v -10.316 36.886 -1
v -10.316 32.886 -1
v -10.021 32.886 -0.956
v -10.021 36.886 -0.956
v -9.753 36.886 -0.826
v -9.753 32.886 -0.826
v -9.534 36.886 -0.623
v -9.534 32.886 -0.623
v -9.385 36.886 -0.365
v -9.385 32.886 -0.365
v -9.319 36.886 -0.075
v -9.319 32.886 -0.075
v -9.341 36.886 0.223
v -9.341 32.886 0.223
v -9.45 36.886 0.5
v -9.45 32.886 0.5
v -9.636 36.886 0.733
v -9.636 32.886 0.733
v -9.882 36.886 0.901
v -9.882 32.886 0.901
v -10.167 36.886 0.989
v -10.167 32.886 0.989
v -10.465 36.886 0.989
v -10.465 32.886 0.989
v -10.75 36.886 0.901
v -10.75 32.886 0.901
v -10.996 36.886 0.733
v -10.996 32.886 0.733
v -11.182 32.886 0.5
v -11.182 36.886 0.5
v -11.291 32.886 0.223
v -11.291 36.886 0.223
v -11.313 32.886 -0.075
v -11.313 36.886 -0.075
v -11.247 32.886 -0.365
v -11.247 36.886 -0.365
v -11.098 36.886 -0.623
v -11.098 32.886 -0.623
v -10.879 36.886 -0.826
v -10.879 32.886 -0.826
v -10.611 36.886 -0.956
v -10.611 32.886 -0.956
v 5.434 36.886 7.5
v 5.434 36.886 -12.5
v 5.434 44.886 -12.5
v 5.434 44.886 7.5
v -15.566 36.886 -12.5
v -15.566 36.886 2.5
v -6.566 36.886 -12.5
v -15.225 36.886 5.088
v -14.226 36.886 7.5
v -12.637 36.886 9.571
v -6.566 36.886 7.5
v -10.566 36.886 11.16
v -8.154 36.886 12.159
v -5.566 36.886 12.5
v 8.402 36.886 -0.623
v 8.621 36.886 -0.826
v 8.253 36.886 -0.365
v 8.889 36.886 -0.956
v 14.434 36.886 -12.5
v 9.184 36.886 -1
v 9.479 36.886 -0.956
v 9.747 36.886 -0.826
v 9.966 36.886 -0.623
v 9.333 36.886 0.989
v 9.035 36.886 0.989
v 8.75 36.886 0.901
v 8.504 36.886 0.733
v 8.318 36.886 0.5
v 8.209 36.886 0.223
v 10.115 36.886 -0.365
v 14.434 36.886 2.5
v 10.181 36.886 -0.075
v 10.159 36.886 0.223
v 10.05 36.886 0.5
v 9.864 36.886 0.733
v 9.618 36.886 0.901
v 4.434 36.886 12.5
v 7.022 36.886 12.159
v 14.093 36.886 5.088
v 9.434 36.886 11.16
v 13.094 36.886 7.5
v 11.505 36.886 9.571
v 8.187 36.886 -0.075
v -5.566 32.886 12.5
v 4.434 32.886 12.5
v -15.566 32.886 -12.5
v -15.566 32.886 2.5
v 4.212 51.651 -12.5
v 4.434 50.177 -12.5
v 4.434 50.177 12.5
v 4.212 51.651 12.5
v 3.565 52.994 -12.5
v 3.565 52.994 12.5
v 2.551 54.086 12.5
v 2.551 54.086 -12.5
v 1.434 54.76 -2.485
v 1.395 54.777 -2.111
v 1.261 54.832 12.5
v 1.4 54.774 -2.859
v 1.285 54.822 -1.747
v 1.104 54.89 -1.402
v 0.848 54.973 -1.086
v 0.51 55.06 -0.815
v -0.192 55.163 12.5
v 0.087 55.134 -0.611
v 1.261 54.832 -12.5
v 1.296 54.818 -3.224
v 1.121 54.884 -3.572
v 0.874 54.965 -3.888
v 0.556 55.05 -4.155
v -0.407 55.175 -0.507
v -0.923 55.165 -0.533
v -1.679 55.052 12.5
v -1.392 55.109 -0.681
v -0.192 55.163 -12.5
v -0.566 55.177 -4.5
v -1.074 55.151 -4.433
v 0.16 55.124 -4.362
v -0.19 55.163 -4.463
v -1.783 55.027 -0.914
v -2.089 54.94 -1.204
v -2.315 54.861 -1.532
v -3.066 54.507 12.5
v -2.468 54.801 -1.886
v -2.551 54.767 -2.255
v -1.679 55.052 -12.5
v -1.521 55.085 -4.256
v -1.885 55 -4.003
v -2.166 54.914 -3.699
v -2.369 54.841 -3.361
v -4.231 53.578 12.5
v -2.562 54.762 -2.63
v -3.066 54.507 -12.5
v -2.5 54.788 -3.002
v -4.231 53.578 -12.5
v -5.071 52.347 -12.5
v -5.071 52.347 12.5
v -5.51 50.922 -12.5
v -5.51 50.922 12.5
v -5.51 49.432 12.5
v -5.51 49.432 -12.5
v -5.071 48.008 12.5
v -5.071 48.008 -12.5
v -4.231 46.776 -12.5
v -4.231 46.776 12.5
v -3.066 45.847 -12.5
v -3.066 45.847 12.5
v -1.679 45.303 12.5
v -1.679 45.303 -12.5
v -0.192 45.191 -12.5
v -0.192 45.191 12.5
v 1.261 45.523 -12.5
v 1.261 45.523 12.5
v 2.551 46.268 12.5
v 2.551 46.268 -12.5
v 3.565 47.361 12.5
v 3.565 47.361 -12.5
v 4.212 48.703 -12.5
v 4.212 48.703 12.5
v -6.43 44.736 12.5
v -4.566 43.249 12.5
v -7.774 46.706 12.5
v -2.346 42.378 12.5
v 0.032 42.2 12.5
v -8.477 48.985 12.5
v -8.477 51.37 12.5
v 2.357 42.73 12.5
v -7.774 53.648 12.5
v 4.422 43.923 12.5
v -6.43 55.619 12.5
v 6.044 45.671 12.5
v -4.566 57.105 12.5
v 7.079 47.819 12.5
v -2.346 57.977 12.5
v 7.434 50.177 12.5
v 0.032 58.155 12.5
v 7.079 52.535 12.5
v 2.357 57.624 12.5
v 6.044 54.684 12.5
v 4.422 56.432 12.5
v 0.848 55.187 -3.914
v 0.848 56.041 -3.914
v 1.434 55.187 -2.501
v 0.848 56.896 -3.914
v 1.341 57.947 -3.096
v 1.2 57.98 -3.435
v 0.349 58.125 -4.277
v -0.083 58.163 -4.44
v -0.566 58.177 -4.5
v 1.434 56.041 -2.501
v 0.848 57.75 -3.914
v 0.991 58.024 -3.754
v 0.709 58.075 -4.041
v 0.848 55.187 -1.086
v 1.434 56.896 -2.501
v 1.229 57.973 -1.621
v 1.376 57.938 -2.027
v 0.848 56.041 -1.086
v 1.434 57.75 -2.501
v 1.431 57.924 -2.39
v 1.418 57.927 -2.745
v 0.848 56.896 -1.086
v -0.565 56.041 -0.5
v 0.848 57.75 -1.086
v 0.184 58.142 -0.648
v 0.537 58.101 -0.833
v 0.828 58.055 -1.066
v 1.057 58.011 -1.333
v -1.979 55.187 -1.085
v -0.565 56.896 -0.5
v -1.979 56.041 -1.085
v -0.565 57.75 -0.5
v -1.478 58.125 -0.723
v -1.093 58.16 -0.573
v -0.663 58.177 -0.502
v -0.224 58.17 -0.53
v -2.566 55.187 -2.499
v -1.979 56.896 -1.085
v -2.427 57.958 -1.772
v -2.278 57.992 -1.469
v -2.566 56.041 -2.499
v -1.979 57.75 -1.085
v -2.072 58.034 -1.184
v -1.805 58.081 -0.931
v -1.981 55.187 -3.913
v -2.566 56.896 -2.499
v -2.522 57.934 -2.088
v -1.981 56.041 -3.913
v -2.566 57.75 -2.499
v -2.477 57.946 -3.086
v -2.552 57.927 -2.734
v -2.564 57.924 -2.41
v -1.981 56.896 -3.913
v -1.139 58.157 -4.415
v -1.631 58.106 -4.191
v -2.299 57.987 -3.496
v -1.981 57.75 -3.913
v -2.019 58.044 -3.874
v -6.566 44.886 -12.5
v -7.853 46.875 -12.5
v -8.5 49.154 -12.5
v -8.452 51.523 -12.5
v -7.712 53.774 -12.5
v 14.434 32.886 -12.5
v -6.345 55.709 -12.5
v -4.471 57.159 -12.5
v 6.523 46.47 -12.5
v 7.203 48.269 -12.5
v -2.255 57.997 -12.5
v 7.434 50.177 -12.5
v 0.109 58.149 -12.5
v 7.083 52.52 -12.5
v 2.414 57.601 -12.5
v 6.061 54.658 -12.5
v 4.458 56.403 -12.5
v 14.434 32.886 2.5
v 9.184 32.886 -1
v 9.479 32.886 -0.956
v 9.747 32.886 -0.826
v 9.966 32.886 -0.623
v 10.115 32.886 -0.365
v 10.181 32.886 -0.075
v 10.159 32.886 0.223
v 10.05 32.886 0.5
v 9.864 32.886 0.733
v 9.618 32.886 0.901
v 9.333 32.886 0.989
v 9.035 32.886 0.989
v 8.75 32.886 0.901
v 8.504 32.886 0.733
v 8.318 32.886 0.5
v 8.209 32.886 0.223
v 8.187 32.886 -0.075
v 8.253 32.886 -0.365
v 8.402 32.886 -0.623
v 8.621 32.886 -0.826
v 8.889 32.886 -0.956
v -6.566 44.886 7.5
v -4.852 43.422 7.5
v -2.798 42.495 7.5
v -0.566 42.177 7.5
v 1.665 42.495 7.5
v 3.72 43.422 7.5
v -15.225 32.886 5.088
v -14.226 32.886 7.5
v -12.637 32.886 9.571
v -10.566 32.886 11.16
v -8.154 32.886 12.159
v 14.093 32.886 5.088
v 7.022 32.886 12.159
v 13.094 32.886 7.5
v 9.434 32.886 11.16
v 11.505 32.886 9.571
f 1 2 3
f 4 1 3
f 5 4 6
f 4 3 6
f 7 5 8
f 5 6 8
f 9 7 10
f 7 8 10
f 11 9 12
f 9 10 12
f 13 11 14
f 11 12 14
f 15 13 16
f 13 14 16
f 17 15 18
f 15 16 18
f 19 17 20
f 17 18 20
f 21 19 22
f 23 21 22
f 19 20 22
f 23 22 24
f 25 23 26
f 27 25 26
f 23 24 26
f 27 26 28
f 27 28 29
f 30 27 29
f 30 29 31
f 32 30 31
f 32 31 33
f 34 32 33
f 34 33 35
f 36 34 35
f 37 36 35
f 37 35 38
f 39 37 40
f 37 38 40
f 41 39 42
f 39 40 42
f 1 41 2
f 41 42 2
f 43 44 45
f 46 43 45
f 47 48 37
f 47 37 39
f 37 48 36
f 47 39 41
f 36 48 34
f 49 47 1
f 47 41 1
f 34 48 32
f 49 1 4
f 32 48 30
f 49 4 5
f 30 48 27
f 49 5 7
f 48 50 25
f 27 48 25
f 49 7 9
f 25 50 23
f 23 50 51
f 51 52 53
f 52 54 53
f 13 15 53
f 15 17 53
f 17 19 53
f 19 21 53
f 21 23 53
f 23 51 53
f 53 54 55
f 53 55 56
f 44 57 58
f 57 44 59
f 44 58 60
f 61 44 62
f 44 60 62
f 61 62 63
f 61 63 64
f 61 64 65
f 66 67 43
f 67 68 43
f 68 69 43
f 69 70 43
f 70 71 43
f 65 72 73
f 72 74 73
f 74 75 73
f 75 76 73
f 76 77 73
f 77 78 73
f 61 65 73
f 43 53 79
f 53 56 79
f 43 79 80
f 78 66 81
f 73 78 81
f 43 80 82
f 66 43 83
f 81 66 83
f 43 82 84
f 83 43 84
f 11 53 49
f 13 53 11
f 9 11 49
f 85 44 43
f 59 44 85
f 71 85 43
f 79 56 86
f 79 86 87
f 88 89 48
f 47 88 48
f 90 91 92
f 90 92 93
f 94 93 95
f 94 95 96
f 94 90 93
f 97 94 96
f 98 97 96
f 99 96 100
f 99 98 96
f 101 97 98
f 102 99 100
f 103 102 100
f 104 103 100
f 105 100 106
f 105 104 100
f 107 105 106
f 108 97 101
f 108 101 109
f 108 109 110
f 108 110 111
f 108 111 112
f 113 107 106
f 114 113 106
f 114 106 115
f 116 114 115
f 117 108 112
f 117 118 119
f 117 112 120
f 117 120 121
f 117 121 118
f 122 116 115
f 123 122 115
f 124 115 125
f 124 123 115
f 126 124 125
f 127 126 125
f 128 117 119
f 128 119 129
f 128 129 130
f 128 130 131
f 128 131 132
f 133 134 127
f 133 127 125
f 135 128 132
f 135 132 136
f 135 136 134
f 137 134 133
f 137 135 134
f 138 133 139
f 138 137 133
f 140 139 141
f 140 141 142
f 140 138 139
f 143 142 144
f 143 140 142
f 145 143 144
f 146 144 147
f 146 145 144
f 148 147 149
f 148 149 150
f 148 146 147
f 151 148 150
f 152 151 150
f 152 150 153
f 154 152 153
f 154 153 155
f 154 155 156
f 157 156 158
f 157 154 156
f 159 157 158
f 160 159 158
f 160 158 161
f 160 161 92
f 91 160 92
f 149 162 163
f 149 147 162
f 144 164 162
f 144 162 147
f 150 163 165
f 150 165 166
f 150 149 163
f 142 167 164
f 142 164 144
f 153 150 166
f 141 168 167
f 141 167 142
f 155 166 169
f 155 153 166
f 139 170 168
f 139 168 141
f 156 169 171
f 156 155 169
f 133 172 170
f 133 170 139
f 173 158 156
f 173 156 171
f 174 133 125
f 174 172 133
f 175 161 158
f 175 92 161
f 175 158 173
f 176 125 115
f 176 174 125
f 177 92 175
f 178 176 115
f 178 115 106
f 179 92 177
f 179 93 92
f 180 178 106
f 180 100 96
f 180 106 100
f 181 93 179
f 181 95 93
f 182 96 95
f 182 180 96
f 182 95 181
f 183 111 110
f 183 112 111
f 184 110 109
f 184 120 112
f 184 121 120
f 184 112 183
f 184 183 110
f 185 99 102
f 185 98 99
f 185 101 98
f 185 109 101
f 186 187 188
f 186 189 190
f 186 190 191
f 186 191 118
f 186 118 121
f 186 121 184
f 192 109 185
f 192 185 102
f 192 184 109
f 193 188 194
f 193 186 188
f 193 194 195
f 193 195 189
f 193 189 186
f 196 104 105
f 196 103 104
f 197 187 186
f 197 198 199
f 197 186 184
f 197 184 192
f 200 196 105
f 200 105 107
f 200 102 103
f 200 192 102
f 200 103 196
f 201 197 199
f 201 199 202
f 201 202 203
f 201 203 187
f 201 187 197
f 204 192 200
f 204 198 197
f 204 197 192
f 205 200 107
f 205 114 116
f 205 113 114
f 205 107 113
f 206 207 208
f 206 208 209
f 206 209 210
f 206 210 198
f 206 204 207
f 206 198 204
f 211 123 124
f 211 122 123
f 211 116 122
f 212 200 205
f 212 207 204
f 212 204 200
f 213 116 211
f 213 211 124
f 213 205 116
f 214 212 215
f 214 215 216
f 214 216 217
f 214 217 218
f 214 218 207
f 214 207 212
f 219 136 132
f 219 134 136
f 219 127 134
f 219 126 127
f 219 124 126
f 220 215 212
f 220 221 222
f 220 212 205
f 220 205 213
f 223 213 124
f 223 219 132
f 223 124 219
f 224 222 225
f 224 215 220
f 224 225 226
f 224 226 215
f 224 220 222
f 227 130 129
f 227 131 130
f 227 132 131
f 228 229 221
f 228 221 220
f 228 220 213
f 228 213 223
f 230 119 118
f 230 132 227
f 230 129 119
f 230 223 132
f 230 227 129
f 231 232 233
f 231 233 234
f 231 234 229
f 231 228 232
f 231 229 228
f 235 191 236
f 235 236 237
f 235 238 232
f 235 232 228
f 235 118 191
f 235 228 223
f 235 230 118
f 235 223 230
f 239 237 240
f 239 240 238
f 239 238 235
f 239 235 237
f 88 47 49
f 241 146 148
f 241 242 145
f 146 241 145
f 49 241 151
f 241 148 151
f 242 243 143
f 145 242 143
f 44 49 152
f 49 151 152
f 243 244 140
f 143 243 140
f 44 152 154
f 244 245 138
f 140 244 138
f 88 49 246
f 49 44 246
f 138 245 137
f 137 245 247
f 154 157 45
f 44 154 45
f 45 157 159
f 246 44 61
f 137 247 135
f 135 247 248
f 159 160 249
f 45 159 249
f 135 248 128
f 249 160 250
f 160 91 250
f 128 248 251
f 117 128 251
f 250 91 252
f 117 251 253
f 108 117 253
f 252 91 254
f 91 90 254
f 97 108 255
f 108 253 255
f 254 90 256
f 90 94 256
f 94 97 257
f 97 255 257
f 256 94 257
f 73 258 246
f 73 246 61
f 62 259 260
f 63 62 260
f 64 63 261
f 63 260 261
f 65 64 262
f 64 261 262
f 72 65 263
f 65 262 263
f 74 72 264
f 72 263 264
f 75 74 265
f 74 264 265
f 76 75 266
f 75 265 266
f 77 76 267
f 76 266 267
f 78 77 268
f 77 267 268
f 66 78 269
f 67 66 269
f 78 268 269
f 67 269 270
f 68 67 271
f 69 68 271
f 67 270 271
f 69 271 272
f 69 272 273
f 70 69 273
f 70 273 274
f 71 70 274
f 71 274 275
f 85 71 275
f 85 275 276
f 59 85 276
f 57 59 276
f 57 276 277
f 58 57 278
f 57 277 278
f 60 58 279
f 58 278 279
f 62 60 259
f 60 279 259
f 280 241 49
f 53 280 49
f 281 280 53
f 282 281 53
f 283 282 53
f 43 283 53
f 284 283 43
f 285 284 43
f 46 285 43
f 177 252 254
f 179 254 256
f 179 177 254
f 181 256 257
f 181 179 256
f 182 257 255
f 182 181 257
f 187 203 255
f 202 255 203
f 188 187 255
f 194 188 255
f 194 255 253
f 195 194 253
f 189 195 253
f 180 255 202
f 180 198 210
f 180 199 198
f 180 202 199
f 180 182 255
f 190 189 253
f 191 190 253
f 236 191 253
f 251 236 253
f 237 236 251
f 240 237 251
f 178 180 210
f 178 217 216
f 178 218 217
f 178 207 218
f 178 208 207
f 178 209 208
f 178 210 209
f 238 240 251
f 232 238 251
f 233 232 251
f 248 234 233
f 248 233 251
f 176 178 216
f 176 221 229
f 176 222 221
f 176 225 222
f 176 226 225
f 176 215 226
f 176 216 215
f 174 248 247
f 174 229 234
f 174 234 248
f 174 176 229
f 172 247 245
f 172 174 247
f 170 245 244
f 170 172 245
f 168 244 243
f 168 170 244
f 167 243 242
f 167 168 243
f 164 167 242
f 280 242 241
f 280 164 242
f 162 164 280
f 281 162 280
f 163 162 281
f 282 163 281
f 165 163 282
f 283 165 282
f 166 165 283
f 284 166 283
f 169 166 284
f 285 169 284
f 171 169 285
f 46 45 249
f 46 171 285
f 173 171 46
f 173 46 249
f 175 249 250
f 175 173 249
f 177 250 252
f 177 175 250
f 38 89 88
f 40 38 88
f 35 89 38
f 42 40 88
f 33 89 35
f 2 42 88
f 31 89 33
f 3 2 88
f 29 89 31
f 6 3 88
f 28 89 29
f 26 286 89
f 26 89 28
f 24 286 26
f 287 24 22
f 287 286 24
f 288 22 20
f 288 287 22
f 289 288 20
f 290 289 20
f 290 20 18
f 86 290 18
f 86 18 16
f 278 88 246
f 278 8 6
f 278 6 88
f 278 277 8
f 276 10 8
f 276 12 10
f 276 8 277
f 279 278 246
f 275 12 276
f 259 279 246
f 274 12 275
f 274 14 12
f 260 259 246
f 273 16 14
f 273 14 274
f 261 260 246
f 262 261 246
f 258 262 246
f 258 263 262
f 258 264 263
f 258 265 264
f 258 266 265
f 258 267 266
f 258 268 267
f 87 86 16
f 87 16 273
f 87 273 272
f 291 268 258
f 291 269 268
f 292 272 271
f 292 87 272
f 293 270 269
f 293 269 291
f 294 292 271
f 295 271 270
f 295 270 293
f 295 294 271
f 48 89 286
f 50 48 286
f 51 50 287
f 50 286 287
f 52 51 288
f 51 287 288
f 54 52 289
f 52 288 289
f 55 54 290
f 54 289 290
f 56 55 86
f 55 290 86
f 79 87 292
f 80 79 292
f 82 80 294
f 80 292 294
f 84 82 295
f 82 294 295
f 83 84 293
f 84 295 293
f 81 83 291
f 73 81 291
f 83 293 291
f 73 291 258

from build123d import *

# Parameters (mm, degrees)
SKETCH1_R             = 8
SKETCH1_R_2           = 5
BOSS_EXTRUDE1_DEPTH   = 12.5
SKETCH1_W             = 30
SKETCH1_H             = 4
BOSS_EXTRUDE1_2_DEPTH = 12.5
BOSS_EXTRUDE2_START   = 7.5
BOSS_EXTRUDE2_DEPTH   = 20
SKETCH2_R             = 1
CUT_EXTRUDE1_DEPTH    = 4
CUT_EXTRUDE2_START    = -26
CUT_EXTRUDE2_DEPTH    = 5


with BuildPart() as part:
    # Sketch1 → Boss-Extrude1 (new, symmetric)
    with BuildSketch(Plane.XY):
        with Locations((-0.566068823, 50.177224178)):
            Circle(SKETCH1_R)
        with Locations((-0.566068823, 50.177224178)):
            Circle(SKETCH1_R_2, mode=Mode.SUBTRACT)
    extrude(amount=BOSS_EXTRUDE1_DEPTH, both=True)



with BuildPart() as body_2:
    # Sketch1 → Boss-Extrude1 2 (new, symmetric)
    with BuildSketch(Plane.XY):
        with Locations((-0.566068823, 34.885721556)):
            Rectangle(SKETCH1_W, SKETCH1_H)
    extrude(amount=BOSS_EXTRUDE1_2_DEPTH, both=True)


with BuildPart() as part_1:
    add(part.part)

    add(body_2.part)  # Boss-Extrude2 merges body 2
    # Sketch1<5> → Boss-Extrude2 (add)
    with BuildSketch(Plane.XY.offset(BOSS_EXTRUDE2_START)):
        with BuildLine():
            Line((-6.566068823, 44.885721556), (-6.566068823, 36.885721556))
            Line((-6.566068823, 36.885721556), (5.433931177, 36.885721556))
            Line((5.433931177, 36.885721556), (5.433931177, 44.885721556))
            ThreePointArc((5.433931177, 44.885721556), (-0.566068823, 42.177224178), (-6.566068823, 44.885721556))
        make_face()
    extrude(amount=-BOSS_EXTRUDE2_DEPTH)

    # Sketch2 → Cut-Extrude1 (cut)
    with BuildSketch(Plane.XZ.offset(-32.885721556)):
        with BuildLine():
            ThreePointArc((-15.566068823, 2.5), (-12.637136635, 9.571067812), (-5.566068823, 12.5))
            Line((-5.566068823, 12.5), (-15.566068823, 12.5))
            Line((-15.566068823, 12.5), (-15.566068823, 2.5))
        make_face()
        with Locations(Location((-10.316068823, 0, 0), (0, 0, 270))):
            Circle(SKETCH2_R)
        with BuildLine():
            Line((14.433931177, 12.5), (4.433931177, 12.5))
            ThreePointArc((4.433931177, 12.5), (11.504998989, 9.571067812), (14.433931177, 2.5))
            Line((14.433931177, 2.5), (14.433931177, 12.5))
        make_face()
        with Locations(Location((9.183931177, 0, 0), (0, 0, 270))):
            Circle(SKETCH2_R)
    extrude(amount=-CUT_EXTRUDE1_DEPTH, mode=Mode.SUBTRACT)

    # Cut-Extrude2: read off the stored shape, not the designer's step
    # Cut-Extrude2 outline → Cut-Extrude2 (cut)
    with BuildSketch(Plane.XZ.offset(-32.885721556).offset(CUT_EXTRUDE2_START)):
        with BuildLine():
            add(Edge.make_bspline(
                [(-0.566068823, -4.5), (-0.035293393, -4.5), (0.481128127, -4.281375894), (1.215722466, -3.546490005), (1.433600027, -3.025317772), (1.434261529, -1.977206776), (1.218792073, -1.456508795), (0.477783673, -0.715350376), (-0.041929223, -0.500221589), (-1.08851599, -0.499778769), (-1.610163203, -0.716198326), (-2.348367378, -1.45334182), (-2.565791182, -1.971191938), (-2.566345912, -3.026705842), (-2.348095204, -3.545904648), (-1.614377567, -4.28061319), (-1.096844254, -4.5), (-0.566068823, -4.5)],
                knots=[0, 0, 0, 0, 0.125, 0.125, 0.25, 0.25, 0.375, 0.375, 0.5, 0.5, 0.625, 0.625, 0.75, 0.75, 0.875, 0.875, 1, 1, 1, 1], degree=3))
        make_face()
    extrude(amount=CUT_EXTRUDE2_DEPTH, mode=Mode.SUBTRACT)


solid = part_1.part
